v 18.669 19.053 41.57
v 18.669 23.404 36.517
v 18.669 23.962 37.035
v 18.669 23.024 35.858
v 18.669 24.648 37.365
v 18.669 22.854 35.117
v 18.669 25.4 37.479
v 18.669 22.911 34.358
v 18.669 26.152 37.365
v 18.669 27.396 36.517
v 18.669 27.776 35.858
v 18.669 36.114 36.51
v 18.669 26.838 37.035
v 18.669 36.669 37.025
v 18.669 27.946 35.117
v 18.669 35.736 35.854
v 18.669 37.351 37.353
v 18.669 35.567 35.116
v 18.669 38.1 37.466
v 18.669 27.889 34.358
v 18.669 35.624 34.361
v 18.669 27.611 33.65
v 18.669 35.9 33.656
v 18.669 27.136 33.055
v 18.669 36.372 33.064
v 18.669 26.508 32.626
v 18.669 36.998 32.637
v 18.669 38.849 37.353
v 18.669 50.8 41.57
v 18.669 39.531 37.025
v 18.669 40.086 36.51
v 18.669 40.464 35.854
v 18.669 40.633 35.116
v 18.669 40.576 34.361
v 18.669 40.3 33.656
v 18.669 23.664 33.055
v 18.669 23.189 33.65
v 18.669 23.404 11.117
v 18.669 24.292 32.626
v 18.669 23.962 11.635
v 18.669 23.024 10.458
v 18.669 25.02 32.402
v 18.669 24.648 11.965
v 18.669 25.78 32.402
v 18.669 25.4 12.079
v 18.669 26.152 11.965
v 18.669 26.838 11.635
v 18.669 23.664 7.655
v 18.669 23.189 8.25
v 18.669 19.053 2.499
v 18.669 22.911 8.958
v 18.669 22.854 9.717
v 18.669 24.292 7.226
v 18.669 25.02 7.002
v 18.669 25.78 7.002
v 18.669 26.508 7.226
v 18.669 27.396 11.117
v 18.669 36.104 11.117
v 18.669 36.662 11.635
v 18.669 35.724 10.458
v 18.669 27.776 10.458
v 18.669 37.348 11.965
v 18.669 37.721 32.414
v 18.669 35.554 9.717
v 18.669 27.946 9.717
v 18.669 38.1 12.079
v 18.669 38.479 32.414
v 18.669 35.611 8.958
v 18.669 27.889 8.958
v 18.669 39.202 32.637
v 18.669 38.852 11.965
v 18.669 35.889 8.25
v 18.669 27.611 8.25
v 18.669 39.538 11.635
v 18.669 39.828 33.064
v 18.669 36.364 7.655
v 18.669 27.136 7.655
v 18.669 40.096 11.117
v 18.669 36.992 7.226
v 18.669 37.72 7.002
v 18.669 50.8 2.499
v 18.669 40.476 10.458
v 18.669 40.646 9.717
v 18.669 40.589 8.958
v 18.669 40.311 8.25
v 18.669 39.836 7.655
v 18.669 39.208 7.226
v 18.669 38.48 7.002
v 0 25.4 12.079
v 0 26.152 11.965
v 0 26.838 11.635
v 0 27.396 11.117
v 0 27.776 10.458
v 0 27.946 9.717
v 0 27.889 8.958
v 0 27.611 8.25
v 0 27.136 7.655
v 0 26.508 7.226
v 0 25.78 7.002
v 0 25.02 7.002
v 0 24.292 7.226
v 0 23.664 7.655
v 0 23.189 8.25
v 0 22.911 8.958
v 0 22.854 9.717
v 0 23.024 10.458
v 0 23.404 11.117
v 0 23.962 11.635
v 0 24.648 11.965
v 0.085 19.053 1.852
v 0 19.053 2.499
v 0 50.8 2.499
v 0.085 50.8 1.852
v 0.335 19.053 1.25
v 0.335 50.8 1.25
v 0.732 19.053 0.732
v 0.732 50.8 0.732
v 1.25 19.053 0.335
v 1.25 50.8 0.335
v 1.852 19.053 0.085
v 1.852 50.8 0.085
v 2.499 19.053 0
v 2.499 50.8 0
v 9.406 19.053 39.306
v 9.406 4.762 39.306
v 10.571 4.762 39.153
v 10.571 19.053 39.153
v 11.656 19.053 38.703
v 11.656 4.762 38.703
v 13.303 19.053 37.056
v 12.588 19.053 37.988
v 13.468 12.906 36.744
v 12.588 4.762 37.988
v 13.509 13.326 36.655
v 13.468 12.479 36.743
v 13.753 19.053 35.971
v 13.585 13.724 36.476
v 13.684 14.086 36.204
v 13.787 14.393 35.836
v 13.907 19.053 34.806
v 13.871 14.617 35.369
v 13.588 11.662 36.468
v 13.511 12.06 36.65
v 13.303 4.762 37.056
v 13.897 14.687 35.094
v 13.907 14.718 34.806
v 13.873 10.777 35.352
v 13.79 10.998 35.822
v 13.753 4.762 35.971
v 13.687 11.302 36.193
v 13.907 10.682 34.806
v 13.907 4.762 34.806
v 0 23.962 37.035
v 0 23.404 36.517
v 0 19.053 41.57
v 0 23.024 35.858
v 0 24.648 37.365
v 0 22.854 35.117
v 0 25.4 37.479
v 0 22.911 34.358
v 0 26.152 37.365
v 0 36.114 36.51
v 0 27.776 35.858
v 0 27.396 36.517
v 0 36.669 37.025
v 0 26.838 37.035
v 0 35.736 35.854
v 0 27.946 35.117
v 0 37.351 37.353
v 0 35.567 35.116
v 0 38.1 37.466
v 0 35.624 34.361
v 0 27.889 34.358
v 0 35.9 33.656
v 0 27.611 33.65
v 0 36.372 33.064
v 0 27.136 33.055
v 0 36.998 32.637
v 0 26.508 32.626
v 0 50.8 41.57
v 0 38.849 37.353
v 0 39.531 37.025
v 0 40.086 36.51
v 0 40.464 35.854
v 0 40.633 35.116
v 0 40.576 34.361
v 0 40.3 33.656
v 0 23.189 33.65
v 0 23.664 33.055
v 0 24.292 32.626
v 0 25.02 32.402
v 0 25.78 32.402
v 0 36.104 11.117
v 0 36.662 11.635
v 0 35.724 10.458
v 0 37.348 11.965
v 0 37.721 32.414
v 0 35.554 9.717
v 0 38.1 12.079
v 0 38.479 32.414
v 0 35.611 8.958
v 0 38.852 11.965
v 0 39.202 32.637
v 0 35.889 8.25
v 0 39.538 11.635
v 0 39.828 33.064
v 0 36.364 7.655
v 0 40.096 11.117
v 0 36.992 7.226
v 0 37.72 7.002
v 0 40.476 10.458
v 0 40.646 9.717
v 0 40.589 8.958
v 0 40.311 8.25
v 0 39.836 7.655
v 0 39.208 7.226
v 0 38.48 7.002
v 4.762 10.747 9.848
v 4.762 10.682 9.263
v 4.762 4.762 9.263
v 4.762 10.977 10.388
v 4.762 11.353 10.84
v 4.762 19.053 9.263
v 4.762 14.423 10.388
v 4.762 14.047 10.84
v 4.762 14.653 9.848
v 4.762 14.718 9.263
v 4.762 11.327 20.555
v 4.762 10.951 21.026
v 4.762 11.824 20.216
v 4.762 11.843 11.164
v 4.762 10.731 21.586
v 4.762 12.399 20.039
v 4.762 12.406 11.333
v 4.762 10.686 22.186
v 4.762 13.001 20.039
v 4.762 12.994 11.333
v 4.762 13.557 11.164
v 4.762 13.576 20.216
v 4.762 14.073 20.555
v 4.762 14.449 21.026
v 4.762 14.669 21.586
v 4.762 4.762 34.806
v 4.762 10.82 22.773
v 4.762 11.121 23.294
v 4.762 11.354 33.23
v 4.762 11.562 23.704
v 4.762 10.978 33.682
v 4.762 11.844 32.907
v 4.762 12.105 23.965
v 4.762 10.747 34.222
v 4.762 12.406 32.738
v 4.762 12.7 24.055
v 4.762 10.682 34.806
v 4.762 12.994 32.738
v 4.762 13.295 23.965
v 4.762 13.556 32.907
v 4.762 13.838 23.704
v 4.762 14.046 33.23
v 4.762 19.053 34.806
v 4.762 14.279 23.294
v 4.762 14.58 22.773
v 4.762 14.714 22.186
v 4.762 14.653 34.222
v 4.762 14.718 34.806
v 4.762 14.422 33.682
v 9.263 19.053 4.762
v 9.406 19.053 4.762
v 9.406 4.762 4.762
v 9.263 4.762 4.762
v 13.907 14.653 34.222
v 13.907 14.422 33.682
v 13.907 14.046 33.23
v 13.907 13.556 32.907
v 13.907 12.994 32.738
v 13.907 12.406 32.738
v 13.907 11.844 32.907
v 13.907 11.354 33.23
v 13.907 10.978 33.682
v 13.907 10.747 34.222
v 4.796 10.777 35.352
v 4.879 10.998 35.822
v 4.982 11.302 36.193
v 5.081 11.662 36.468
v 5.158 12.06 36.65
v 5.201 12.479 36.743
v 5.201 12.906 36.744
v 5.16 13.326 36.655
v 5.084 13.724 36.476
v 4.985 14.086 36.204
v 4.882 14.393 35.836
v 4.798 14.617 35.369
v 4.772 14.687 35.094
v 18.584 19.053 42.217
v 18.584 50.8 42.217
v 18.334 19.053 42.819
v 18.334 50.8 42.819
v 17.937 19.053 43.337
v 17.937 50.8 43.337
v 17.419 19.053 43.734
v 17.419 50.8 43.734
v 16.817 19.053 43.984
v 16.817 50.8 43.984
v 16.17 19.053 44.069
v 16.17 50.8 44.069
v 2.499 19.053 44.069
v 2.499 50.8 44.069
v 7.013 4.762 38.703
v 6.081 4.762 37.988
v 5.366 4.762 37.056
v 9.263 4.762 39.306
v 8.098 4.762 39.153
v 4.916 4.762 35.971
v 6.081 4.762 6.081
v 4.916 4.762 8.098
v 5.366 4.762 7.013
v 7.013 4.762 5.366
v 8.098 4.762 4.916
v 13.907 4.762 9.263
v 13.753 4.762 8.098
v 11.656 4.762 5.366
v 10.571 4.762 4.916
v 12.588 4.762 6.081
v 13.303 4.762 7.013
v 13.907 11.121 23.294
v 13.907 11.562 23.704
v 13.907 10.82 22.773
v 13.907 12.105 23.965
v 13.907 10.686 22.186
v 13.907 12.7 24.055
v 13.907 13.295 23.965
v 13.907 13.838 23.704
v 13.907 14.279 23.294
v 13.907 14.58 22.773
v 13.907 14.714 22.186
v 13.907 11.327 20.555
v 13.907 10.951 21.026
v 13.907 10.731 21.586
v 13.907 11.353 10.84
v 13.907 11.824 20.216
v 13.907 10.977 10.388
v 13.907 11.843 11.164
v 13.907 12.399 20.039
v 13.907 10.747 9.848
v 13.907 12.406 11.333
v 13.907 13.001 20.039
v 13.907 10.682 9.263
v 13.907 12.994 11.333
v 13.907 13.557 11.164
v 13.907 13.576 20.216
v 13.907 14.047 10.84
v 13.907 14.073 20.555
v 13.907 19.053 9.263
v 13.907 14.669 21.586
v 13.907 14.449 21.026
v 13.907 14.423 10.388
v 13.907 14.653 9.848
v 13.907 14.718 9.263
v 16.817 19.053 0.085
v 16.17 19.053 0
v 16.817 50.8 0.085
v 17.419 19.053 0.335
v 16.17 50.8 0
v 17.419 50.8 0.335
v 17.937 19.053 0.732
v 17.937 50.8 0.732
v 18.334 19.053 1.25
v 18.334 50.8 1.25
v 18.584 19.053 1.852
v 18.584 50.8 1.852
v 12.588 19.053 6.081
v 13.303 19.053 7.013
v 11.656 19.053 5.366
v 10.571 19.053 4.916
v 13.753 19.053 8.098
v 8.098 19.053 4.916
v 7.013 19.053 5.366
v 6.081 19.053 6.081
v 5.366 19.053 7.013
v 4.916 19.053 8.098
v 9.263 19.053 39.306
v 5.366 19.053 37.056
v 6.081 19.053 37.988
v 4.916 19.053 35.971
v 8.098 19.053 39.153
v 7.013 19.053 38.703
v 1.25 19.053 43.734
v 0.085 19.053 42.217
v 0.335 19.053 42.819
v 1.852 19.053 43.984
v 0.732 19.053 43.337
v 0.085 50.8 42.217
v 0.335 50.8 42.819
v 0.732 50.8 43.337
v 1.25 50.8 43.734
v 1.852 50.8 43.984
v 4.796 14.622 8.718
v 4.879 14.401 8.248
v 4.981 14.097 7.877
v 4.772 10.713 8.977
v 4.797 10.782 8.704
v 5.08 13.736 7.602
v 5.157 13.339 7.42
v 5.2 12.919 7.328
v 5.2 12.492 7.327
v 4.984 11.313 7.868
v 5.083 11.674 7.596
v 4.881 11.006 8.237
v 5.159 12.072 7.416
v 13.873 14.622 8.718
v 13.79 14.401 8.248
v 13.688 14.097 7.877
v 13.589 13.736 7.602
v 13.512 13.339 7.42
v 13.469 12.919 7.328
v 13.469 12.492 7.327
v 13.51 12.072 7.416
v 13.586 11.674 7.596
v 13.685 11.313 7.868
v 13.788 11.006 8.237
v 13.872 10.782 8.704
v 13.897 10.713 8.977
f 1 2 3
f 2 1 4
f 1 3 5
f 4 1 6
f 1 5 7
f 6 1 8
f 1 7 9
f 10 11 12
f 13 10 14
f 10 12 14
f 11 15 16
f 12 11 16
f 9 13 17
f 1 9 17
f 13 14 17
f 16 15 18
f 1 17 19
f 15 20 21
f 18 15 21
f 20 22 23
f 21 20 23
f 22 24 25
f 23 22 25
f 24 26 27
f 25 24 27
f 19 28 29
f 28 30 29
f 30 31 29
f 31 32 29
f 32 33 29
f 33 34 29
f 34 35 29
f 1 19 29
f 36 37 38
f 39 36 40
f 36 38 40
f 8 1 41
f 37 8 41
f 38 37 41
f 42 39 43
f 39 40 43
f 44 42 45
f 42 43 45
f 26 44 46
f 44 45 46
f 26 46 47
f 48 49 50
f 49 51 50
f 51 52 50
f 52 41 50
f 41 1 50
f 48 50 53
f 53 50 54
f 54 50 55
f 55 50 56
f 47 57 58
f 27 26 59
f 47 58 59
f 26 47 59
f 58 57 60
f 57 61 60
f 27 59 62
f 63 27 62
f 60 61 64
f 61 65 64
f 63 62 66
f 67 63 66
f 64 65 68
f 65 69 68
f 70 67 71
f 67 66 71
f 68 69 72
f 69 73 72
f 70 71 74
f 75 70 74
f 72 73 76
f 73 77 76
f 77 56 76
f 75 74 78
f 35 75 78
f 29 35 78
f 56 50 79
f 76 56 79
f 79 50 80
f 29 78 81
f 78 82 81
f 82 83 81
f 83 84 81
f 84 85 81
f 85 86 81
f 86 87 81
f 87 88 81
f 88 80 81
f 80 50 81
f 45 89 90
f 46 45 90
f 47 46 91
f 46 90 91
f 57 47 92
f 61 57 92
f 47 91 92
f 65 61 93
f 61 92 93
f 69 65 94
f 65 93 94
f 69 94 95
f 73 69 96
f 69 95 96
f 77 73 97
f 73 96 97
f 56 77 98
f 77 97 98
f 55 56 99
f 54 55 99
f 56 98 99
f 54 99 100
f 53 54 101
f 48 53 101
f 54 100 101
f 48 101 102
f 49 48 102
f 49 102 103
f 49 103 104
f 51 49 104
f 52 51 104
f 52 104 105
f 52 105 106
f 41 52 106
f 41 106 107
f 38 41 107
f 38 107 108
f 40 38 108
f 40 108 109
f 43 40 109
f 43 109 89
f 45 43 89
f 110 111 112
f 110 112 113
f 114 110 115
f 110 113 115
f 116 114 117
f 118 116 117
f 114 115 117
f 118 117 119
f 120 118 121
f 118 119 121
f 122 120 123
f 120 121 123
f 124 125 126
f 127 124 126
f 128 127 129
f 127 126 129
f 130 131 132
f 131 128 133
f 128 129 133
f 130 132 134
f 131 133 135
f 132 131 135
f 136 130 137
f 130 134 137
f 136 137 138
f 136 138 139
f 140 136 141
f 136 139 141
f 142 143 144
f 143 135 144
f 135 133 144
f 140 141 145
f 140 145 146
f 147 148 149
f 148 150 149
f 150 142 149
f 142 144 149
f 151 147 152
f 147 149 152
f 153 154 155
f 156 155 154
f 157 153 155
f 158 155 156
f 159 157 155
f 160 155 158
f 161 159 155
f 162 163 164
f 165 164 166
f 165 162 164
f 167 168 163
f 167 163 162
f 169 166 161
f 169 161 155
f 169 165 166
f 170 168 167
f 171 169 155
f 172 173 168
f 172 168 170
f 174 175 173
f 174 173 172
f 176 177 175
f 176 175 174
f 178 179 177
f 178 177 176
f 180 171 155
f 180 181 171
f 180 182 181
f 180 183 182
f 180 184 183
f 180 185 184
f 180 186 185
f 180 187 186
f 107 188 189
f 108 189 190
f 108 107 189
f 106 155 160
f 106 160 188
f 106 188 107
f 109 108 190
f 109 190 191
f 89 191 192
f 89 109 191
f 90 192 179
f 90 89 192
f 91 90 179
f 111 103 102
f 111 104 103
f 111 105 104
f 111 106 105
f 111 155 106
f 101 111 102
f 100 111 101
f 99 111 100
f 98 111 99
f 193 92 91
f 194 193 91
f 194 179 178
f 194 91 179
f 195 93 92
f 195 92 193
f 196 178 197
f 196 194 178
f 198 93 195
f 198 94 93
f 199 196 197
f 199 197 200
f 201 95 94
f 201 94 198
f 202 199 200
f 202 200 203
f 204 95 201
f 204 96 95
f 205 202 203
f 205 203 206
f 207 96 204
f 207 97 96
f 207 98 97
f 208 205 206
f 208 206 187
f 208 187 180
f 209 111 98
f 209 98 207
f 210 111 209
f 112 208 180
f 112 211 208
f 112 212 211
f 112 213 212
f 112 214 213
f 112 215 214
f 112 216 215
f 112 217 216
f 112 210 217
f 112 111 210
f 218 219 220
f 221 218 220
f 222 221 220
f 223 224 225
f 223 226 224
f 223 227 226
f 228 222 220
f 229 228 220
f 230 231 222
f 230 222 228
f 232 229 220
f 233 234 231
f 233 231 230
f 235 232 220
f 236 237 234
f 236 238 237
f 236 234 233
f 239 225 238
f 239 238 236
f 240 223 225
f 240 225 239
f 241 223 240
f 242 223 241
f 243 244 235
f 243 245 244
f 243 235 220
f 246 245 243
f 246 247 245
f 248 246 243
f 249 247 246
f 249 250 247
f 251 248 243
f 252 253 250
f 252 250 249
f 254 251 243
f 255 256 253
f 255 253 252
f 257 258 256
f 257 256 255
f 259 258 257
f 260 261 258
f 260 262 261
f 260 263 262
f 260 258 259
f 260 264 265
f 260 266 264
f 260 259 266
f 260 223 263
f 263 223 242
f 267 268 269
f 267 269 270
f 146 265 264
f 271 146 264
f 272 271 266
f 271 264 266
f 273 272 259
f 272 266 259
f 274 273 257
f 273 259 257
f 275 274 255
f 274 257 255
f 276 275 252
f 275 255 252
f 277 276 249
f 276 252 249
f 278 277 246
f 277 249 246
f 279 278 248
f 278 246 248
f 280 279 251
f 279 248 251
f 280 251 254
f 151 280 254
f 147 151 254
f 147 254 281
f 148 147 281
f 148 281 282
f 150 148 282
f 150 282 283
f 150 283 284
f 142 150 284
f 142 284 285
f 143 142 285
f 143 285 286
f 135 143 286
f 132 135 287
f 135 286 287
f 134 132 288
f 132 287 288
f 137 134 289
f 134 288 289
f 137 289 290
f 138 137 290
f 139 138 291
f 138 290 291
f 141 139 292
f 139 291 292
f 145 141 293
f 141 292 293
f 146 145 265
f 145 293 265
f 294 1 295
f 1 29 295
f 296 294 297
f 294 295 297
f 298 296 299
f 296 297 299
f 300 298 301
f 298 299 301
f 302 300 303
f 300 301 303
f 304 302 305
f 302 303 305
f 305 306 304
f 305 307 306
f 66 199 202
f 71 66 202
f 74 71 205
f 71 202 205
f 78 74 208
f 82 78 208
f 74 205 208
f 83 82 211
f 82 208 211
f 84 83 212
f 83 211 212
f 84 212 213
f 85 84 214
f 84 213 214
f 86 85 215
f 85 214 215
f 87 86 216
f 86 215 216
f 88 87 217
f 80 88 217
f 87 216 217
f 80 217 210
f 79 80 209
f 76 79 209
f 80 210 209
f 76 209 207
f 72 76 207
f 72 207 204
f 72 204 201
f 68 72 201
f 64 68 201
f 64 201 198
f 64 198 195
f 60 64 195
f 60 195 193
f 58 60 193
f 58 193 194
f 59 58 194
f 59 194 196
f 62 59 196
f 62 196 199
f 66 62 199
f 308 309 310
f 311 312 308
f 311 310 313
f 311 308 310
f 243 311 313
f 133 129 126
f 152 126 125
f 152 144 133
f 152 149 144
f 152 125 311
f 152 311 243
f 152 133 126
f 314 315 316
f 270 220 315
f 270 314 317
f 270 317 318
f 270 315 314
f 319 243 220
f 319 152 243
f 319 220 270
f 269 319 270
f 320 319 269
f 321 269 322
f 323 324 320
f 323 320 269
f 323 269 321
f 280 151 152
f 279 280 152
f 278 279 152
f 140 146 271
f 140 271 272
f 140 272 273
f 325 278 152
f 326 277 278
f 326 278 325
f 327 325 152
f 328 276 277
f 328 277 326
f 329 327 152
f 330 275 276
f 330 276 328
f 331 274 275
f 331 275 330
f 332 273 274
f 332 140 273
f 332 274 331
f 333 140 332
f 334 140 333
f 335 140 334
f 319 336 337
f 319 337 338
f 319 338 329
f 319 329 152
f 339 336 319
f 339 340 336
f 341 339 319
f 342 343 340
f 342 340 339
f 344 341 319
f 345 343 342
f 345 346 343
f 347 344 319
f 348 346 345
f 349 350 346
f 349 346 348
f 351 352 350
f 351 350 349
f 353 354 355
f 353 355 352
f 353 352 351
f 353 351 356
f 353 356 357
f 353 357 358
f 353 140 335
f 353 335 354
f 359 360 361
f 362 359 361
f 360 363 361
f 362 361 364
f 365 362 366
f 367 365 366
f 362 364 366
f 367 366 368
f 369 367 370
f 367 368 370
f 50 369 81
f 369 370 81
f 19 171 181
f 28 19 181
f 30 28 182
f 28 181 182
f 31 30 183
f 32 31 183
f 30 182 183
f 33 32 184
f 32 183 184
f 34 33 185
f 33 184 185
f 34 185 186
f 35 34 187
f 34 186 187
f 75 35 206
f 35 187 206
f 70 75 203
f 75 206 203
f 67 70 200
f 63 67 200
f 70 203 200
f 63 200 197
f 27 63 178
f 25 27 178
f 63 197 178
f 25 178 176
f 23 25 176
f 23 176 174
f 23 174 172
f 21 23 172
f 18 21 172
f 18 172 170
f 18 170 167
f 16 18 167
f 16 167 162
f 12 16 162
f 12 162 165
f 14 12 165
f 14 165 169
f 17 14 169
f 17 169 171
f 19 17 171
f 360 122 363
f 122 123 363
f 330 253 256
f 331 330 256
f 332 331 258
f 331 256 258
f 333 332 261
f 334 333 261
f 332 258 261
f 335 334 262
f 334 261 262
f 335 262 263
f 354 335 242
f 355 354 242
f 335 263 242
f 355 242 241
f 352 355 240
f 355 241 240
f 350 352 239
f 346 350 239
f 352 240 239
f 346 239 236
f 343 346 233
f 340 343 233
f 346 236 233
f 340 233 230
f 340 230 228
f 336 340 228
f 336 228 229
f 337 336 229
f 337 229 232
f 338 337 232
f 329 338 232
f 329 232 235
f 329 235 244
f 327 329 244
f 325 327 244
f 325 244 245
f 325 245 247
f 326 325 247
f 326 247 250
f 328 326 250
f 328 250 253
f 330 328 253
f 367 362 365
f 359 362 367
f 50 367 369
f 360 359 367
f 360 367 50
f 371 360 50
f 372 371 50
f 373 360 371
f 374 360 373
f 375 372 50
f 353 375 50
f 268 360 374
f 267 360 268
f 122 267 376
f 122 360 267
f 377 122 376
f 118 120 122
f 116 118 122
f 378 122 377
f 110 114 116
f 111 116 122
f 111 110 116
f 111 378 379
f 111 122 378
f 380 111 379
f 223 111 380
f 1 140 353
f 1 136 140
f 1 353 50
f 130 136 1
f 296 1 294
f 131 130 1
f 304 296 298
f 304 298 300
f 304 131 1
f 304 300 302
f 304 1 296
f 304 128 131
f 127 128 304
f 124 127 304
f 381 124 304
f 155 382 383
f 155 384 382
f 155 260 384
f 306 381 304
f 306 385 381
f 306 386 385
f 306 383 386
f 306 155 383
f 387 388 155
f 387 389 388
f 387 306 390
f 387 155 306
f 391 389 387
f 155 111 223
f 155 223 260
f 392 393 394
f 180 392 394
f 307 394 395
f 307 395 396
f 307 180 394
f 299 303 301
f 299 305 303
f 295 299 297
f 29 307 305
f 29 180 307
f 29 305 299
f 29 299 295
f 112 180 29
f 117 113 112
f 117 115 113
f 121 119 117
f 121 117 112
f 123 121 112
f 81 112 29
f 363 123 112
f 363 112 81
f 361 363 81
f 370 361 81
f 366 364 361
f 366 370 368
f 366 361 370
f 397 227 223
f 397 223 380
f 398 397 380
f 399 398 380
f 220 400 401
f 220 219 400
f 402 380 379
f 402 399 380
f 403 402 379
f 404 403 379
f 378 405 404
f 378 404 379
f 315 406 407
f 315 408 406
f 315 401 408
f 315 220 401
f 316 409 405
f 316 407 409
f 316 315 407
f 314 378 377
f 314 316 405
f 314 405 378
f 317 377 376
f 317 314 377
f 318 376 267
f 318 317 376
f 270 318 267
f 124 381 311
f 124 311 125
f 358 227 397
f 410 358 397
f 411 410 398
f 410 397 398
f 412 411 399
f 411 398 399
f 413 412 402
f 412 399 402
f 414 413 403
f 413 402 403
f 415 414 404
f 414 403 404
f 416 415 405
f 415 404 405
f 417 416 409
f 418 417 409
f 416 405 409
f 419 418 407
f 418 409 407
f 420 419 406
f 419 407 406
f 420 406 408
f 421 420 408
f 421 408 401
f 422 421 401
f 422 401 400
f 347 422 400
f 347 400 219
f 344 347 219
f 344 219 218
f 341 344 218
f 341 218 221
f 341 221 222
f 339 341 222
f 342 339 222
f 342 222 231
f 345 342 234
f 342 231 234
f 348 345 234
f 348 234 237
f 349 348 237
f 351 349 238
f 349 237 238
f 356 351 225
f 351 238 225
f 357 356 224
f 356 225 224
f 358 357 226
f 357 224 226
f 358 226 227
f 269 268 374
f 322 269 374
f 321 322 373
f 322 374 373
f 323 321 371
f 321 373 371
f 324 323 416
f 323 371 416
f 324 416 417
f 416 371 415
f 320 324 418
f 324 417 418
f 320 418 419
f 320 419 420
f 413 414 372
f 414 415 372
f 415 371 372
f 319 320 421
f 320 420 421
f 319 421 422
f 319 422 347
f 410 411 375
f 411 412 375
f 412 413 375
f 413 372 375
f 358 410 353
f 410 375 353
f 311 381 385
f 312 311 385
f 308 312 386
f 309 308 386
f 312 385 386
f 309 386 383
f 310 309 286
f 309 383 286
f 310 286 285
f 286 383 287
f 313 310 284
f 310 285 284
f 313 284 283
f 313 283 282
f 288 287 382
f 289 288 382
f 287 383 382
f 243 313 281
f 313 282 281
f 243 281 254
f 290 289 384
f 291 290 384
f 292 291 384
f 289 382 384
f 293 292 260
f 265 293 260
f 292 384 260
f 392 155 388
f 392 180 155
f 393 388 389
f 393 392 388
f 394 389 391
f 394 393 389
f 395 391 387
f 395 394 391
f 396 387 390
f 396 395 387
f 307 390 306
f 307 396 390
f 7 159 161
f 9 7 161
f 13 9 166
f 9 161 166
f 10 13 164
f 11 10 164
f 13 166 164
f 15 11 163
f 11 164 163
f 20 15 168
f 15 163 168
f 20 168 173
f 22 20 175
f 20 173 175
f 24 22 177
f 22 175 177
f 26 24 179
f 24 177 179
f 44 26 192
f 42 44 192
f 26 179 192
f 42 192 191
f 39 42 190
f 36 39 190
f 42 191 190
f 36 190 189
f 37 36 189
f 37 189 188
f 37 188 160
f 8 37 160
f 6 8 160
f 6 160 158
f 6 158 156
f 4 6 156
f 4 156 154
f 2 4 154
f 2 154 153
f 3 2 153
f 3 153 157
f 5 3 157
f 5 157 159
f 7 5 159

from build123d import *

# Parameters (mm, degrees)
SKETCH1_W           = 18.669
SKETCH1_H           = 50.8
BOSS_EXTRUDE1_DEPTH = 44.069
SKETCH2_W           = 44.069
SKETCH2_H           = 4.7625
CUT_EXTRUDE1_DEPTH  = 70.794328724
SKETCH3_W           = 44.069
SKETCH3_H           = 14.29004
CUT_EXTRUDE2_DEPTH  = 4.7625
SKETCH5_W           = 44.069
SKETCH5_H           = 14.29004
CUT_EXTRUDE3_DEPTH  = 4.7625
SKETCH4_W           = 18.669
SKETCH4_H           = 14.29004
CUT_EXTRUDE4_DEPTH  = 4.7625
SKETCH6_W           = 18.669
SKETCH6_H           = 14.29004
CUT_EXTRUDE5_DEPTH  = 4.7625
FILLET1_R           = 4.50088
FILLET2_R           = 2.49936
SKETCH7_R           = 2.5527
SKETCH7_R_2         = 2.54
CUT_EXTRUDE6_DEPTH  = 70.794328724
SKETCH8_R           = 2.0193
CUT_EXTRUDE7_DEPTH  = 69.673921566


with BuildPart() as part:
    # Sketch1 → Boss-Extrude1 (new body)
    with BuildSketch(Plane.XY):
        with Locations((9.3345, 25.4)):
            Rectangle(SKETCH1_W, SKETCH1_H)
    extrude(amount=BOSS_EXTRUDE1_DEPTH)

    # Sketch2 → Cut-Extrude1 (cut, through all)
    with BuildSketch(Plane(origin=(18.669, 0, 0), x_dir=(0, 0, -1), z_dir=(1, 0, 0))):
        with Locations((-22.0345, 2.38125)):
            Rectangle(SKETCH2_W, SKETCH2_H)
    extrude(amount=-CUT_EXTRUDE1_DEPTH, mode=Mode.SUBTRACT)

    # Sketch3 → Cut-Extrude2 (cut)
    with BuildSketch(Plane(origin=(18.669, 0, 0), x_dir=(0, 0, -1), z_dir=(1, 0, 0))):
        with Locations((-22.0345, 11.90752)):
            Rectangle(SKETCH3_W, SKETCH3_H)
    extrude(amount=-CUT_EXTRUDE2_DEPTH, mode=Mode.SUBTRACT)

    # Sketch5 → Cut-Extrude3 (cut)
    with BuildSketch(Plane.ZY):
        with Locations((22.0345, 11.90752)):
            Rectangle(SKETCH5_W, SKETCH5_H)
    extrude(amount=-CUT_EXTRUDE3_DEPTH, mode=Mode.SUBTRACT)

    # Sketch4 → Cut-Extrude4 (cut)
    with BuildSketch(Plane.XY.offset(44.069)):
        with Locations((9.3345, 11.90752)):
            Rectangle(SKETCH4_W, SKETCH4_H)
    extrude(amount=-CUT_EXTRUDE4_DEPTH, mode=Mode.SUBTRACT)

    # Sketch6 → Cut-Extrude5 (cut)
    with BuildSketch(Plane(origin=(0, 0, 0), x_dir=(-1, 0, 0), z_dir=(0, 0, -1))):
        with Locations((-9.3345, 11.90752)):
            Rectangle(SKETCH6_W, SKETCH6_H)
    extrude(amount=-CUT_EXTRUDE5_DEPTH, mode=Mode.SUBTRACT)

    # Fillet1
    fillet1_edges = [part.edges().sort_by_distance(p)[0] for p in [
        (4.7625, 11.90752, 39.3065),
        (13.9065, 11.90752, 39.3065),
        (4.7625, 11.90752, 4.7625),
        (13.9065, 11.90752, 4.7625),
    ]]
    fillet(fillet1_edges, radius=FILLET1_R)

    # Fillet2
    fillet2_edges = [part.edges().sort_by_distance(p)[0] for p in [
        (18.669, 34.92627, 0),
        (18.669, 34.92627, 44.069),
        (0, 34.92627, 44.069),
        (0, 34.92627, 0),
    ]]
    fillet(fillet2_edges, radius=FILLET2_R)

    # Sketch7 → Cut-Extrude6 (cut, through all)
    with BuildSketch(Plane.ZY):
        with Locations((9.52588, 38.1)):
            Circle(SKETCH7_R)
        with Locations((34.92588, 38.1)):
            Circle(SKETCH7_R_2)
        with Locations((34.92588, 25.4)):
            Circle(SKETCH7_R)
        with Locations((9.52588, 25.4)):
            Circle(SKETCH7_R)
    extrude(amount=-CUT_EXTRUDE6_DEPTH, mode=Mode.SUBTRACT)

    # Sketch8 → Cut-Extrude7 (cut, through all)
    with BuildSketch(Plane.ZY.offset(-4.7625)):
        with Locations((22.03538, 12.7)):
            Circle(SKETCH8_R)
        with Locations(Location((34.73538, 12.7, 0), (0, 0, 88.006602506))):
            Circle(SKETCH8_R)
        with Locations(Location((9.33538, 12.7, 0), (0, 0, 92.043366879))):
            Circle(SKETCH8_R)
    extrude(amount=-CUT_EXTRUDE7_DEPTH, mode=Mode.SUBTRACT)


solid = part.part
